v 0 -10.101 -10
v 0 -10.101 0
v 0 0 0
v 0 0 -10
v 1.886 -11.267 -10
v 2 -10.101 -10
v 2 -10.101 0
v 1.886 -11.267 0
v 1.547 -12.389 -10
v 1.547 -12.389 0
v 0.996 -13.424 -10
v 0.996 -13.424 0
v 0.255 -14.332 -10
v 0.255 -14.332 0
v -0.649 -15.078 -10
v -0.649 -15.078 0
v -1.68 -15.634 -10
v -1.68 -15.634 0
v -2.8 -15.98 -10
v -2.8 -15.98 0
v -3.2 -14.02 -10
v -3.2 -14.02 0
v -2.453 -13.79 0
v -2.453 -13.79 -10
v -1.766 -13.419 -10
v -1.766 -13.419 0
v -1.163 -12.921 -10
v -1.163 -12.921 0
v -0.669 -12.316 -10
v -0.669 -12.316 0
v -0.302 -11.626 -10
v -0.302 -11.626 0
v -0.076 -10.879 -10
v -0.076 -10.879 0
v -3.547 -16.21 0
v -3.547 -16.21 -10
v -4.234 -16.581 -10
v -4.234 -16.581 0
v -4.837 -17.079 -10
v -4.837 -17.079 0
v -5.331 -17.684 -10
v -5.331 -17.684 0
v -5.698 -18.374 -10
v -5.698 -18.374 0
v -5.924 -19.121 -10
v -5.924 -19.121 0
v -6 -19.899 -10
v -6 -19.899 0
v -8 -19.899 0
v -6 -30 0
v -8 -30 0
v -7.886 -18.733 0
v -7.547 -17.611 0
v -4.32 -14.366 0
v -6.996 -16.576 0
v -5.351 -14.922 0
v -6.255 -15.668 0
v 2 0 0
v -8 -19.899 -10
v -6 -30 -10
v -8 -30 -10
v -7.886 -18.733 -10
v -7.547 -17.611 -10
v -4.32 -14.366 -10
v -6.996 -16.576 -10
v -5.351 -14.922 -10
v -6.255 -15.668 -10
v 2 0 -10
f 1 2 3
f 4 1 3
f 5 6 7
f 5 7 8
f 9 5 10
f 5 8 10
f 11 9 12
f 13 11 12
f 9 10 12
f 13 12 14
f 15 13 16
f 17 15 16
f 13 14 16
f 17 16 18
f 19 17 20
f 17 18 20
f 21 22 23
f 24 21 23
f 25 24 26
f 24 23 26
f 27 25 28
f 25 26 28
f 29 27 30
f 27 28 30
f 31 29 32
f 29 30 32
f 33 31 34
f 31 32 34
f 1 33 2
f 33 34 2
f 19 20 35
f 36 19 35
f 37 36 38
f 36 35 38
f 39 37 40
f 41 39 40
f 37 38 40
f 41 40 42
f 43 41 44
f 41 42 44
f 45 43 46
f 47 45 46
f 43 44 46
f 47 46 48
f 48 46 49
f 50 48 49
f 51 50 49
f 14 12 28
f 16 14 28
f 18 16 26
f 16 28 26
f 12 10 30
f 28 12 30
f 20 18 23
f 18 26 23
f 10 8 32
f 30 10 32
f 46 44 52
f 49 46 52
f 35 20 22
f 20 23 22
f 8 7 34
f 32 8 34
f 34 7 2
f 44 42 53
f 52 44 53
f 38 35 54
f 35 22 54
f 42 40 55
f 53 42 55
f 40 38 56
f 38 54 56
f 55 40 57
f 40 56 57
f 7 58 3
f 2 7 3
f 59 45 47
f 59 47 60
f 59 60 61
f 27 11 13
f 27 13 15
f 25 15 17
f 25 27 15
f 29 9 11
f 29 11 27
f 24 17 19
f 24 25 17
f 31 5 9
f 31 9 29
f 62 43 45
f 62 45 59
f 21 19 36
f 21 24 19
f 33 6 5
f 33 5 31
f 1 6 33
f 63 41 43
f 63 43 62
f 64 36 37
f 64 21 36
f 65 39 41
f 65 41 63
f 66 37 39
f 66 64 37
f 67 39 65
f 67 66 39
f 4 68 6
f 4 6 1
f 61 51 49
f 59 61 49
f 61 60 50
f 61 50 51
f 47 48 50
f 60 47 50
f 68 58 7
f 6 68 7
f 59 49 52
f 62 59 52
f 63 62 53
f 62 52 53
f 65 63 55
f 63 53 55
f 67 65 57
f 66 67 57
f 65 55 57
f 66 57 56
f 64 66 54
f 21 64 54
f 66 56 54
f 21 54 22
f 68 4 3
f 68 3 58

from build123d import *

# Parameters (mm, degrees)
BOSS_EXTRUDE2_DEPTH = 10


with BuildPart() as part:
    # Sketch1 → Boss-Extrude2 (new body)
    with BuildSketch(Plane.XY):
        with BuildLine():
            Line((0, 0), (2, 0))
            Line((2, 0), (2, -10.101020514))
            ThreePointArc((2, -10.101020514), (0.647580015, -13.895753707), (-2.8, -15.979795897))
            ThreePointArc((-2.8, -15.979795897), (-5.098386677, -17.369157357), (-6, -19.898979486))
            Line((-6, -19.898979486), (-6, -30))
            Line((-6, -30), (-8, -30))
            Line((-8, -30), (-8, -19.898979486))
            ThreePointArc((-8, -19.898979486), (-6.647580015, -16.104246293), (-3.2, -14.020204103))
            ThreePointArc((-3.2, -14.020204103), (-0.901613323, -12.630842643), (0, -10.101020514))
            Line((0, -10.101020514), (0, 0))
        make_face()
    extrude(amount=-BOSS_EXTRUDE2_DEPTH)


solid = part.part
